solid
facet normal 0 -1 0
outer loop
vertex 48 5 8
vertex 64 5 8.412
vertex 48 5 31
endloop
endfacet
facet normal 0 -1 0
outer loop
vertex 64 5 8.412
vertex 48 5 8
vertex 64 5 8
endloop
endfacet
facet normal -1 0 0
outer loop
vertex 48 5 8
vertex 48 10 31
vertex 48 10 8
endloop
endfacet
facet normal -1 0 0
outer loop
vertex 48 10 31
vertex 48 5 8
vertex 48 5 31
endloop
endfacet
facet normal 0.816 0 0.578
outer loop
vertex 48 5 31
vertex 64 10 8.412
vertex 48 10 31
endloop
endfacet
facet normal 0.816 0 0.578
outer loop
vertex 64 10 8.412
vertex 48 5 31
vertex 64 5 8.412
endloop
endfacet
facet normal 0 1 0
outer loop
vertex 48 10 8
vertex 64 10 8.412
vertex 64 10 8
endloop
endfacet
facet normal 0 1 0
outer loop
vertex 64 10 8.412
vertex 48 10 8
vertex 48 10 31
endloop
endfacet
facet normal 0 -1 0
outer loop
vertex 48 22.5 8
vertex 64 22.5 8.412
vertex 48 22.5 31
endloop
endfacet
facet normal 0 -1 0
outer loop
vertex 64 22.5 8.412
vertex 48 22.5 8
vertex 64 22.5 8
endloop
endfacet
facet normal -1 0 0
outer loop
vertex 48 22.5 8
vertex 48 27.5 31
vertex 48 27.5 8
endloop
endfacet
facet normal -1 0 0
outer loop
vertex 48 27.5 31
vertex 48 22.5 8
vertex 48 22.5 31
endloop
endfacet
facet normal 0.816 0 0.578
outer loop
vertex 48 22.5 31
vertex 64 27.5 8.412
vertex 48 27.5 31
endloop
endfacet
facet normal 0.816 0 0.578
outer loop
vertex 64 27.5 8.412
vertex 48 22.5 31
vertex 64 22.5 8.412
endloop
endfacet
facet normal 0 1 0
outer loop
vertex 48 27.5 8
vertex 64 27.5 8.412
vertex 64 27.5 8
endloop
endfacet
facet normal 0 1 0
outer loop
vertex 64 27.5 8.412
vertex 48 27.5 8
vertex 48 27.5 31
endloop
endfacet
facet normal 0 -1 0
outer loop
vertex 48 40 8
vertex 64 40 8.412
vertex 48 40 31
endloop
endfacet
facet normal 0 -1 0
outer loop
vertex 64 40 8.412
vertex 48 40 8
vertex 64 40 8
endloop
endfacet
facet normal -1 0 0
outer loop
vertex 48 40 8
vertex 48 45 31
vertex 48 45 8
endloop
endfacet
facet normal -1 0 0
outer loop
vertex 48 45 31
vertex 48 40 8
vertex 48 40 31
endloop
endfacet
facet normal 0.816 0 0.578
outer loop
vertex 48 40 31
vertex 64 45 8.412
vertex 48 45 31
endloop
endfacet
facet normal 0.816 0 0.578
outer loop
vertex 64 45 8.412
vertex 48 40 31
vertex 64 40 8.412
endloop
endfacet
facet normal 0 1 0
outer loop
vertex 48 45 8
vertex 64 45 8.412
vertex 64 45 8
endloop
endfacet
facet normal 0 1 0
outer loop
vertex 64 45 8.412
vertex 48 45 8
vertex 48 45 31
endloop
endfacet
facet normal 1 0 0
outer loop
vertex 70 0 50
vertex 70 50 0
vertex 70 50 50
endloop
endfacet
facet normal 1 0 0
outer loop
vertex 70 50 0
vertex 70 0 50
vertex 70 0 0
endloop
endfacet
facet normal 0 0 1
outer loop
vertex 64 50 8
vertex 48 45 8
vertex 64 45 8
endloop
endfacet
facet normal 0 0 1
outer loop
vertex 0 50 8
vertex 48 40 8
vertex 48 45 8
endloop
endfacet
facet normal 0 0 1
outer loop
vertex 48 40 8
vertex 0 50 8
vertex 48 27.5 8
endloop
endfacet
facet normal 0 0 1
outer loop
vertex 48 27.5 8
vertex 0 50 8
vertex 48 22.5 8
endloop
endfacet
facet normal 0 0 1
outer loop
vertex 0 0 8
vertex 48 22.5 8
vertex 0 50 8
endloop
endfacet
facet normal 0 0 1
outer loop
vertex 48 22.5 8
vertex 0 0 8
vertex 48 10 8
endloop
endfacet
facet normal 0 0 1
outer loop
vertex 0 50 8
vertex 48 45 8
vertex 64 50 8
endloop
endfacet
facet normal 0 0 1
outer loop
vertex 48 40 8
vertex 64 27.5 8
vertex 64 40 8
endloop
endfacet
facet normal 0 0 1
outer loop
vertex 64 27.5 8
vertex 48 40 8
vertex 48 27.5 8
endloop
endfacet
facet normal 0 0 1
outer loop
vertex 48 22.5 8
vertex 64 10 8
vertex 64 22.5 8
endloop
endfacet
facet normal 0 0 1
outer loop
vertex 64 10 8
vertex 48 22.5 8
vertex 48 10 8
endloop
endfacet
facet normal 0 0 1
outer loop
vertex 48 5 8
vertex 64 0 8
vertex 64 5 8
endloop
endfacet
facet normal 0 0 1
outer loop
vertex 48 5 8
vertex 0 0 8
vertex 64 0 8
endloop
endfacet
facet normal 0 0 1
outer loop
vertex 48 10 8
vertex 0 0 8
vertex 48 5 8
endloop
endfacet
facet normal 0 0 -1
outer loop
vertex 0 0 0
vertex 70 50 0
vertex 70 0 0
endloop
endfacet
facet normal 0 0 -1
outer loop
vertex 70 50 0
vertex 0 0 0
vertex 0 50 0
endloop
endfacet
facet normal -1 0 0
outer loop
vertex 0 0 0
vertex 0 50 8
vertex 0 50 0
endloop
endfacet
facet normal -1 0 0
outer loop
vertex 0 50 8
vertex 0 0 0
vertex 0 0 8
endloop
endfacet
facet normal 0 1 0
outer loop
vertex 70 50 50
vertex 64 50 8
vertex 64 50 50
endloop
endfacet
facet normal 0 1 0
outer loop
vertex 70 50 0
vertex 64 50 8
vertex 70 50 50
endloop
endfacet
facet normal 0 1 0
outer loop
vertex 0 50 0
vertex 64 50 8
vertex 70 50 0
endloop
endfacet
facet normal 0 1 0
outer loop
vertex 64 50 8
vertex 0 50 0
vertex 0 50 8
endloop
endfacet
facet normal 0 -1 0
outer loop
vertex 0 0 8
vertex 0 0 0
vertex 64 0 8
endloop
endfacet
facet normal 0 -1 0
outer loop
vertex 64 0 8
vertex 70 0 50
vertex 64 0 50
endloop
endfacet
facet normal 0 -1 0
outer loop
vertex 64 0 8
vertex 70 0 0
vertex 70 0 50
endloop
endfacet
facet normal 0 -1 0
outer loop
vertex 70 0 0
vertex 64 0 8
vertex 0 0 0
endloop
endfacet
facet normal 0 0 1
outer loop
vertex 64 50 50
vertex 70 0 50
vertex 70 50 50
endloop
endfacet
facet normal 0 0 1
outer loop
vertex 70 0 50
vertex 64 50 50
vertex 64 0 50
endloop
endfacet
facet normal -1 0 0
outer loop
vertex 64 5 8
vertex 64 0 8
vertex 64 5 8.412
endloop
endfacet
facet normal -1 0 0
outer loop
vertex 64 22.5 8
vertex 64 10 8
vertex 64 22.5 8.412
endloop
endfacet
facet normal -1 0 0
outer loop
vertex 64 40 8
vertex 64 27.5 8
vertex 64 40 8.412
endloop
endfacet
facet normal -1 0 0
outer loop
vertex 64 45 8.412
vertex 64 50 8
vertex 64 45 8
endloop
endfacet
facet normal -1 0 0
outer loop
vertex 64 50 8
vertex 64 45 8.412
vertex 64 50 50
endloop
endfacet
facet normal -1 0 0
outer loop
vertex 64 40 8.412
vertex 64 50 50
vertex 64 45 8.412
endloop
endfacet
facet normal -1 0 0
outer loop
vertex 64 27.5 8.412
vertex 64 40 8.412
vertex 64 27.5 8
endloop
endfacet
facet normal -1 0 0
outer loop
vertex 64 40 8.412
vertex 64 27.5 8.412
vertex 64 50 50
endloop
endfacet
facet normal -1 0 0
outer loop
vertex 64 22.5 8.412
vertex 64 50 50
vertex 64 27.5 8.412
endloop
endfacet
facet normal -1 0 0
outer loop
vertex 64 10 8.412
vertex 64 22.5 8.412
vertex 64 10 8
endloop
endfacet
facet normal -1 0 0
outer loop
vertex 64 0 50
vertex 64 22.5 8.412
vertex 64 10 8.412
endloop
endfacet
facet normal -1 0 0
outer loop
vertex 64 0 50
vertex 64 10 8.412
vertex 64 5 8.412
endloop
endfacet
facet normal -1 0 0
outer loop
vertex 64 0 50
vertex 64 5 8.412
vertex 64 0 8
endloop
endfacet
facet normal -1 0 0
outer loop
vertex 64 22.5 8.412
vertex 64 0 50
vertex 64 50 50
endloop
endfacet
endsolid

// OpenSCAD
$fn = 32;

// ----------------------------------------------------------------------
// Rib bracket: 3-gusset L bracket
// ----------------------------------------------------------------------

// --- parameters (mm) ---
base_l = 70;              // foot length, X
base_w = 50;              // foot width, Y
base_t = 8;               // foot thickness
plate_t = 6;              // upright plate thickness
plate_h = 50;             // overall height
gus_l = 16;               // gusset leg along the foot
gus_h = 24;               // gusset height
gus_t = 5;                // gusset thickness
gus_edge = 5;             // gusset margin from the foot edge
n_gus = 3;                // gusset count

gus_pitch = (base_w - 2 * gus_edge - gus_t) / (n_gus - 1);  // gusset pitch

union() {
  cube([base_l, base_w, base_t]);
  translate([base_l - plate_t, 0, base_t - 1])
    cube([plate_t, base_w, plate_h - base_t + 1]);
  for (i = [0 : n_gus - 1])
    translate([base_l - plate_t - gus_l, gus_edge + i * gus_pitch, base_t - 1])
      rotate([-90, 0, 0])
        linear_extrude(height = gus_t)
          polygon(points = [[0, 0], [gus_l + 1, 0], [0, -gus_h]]);
}
